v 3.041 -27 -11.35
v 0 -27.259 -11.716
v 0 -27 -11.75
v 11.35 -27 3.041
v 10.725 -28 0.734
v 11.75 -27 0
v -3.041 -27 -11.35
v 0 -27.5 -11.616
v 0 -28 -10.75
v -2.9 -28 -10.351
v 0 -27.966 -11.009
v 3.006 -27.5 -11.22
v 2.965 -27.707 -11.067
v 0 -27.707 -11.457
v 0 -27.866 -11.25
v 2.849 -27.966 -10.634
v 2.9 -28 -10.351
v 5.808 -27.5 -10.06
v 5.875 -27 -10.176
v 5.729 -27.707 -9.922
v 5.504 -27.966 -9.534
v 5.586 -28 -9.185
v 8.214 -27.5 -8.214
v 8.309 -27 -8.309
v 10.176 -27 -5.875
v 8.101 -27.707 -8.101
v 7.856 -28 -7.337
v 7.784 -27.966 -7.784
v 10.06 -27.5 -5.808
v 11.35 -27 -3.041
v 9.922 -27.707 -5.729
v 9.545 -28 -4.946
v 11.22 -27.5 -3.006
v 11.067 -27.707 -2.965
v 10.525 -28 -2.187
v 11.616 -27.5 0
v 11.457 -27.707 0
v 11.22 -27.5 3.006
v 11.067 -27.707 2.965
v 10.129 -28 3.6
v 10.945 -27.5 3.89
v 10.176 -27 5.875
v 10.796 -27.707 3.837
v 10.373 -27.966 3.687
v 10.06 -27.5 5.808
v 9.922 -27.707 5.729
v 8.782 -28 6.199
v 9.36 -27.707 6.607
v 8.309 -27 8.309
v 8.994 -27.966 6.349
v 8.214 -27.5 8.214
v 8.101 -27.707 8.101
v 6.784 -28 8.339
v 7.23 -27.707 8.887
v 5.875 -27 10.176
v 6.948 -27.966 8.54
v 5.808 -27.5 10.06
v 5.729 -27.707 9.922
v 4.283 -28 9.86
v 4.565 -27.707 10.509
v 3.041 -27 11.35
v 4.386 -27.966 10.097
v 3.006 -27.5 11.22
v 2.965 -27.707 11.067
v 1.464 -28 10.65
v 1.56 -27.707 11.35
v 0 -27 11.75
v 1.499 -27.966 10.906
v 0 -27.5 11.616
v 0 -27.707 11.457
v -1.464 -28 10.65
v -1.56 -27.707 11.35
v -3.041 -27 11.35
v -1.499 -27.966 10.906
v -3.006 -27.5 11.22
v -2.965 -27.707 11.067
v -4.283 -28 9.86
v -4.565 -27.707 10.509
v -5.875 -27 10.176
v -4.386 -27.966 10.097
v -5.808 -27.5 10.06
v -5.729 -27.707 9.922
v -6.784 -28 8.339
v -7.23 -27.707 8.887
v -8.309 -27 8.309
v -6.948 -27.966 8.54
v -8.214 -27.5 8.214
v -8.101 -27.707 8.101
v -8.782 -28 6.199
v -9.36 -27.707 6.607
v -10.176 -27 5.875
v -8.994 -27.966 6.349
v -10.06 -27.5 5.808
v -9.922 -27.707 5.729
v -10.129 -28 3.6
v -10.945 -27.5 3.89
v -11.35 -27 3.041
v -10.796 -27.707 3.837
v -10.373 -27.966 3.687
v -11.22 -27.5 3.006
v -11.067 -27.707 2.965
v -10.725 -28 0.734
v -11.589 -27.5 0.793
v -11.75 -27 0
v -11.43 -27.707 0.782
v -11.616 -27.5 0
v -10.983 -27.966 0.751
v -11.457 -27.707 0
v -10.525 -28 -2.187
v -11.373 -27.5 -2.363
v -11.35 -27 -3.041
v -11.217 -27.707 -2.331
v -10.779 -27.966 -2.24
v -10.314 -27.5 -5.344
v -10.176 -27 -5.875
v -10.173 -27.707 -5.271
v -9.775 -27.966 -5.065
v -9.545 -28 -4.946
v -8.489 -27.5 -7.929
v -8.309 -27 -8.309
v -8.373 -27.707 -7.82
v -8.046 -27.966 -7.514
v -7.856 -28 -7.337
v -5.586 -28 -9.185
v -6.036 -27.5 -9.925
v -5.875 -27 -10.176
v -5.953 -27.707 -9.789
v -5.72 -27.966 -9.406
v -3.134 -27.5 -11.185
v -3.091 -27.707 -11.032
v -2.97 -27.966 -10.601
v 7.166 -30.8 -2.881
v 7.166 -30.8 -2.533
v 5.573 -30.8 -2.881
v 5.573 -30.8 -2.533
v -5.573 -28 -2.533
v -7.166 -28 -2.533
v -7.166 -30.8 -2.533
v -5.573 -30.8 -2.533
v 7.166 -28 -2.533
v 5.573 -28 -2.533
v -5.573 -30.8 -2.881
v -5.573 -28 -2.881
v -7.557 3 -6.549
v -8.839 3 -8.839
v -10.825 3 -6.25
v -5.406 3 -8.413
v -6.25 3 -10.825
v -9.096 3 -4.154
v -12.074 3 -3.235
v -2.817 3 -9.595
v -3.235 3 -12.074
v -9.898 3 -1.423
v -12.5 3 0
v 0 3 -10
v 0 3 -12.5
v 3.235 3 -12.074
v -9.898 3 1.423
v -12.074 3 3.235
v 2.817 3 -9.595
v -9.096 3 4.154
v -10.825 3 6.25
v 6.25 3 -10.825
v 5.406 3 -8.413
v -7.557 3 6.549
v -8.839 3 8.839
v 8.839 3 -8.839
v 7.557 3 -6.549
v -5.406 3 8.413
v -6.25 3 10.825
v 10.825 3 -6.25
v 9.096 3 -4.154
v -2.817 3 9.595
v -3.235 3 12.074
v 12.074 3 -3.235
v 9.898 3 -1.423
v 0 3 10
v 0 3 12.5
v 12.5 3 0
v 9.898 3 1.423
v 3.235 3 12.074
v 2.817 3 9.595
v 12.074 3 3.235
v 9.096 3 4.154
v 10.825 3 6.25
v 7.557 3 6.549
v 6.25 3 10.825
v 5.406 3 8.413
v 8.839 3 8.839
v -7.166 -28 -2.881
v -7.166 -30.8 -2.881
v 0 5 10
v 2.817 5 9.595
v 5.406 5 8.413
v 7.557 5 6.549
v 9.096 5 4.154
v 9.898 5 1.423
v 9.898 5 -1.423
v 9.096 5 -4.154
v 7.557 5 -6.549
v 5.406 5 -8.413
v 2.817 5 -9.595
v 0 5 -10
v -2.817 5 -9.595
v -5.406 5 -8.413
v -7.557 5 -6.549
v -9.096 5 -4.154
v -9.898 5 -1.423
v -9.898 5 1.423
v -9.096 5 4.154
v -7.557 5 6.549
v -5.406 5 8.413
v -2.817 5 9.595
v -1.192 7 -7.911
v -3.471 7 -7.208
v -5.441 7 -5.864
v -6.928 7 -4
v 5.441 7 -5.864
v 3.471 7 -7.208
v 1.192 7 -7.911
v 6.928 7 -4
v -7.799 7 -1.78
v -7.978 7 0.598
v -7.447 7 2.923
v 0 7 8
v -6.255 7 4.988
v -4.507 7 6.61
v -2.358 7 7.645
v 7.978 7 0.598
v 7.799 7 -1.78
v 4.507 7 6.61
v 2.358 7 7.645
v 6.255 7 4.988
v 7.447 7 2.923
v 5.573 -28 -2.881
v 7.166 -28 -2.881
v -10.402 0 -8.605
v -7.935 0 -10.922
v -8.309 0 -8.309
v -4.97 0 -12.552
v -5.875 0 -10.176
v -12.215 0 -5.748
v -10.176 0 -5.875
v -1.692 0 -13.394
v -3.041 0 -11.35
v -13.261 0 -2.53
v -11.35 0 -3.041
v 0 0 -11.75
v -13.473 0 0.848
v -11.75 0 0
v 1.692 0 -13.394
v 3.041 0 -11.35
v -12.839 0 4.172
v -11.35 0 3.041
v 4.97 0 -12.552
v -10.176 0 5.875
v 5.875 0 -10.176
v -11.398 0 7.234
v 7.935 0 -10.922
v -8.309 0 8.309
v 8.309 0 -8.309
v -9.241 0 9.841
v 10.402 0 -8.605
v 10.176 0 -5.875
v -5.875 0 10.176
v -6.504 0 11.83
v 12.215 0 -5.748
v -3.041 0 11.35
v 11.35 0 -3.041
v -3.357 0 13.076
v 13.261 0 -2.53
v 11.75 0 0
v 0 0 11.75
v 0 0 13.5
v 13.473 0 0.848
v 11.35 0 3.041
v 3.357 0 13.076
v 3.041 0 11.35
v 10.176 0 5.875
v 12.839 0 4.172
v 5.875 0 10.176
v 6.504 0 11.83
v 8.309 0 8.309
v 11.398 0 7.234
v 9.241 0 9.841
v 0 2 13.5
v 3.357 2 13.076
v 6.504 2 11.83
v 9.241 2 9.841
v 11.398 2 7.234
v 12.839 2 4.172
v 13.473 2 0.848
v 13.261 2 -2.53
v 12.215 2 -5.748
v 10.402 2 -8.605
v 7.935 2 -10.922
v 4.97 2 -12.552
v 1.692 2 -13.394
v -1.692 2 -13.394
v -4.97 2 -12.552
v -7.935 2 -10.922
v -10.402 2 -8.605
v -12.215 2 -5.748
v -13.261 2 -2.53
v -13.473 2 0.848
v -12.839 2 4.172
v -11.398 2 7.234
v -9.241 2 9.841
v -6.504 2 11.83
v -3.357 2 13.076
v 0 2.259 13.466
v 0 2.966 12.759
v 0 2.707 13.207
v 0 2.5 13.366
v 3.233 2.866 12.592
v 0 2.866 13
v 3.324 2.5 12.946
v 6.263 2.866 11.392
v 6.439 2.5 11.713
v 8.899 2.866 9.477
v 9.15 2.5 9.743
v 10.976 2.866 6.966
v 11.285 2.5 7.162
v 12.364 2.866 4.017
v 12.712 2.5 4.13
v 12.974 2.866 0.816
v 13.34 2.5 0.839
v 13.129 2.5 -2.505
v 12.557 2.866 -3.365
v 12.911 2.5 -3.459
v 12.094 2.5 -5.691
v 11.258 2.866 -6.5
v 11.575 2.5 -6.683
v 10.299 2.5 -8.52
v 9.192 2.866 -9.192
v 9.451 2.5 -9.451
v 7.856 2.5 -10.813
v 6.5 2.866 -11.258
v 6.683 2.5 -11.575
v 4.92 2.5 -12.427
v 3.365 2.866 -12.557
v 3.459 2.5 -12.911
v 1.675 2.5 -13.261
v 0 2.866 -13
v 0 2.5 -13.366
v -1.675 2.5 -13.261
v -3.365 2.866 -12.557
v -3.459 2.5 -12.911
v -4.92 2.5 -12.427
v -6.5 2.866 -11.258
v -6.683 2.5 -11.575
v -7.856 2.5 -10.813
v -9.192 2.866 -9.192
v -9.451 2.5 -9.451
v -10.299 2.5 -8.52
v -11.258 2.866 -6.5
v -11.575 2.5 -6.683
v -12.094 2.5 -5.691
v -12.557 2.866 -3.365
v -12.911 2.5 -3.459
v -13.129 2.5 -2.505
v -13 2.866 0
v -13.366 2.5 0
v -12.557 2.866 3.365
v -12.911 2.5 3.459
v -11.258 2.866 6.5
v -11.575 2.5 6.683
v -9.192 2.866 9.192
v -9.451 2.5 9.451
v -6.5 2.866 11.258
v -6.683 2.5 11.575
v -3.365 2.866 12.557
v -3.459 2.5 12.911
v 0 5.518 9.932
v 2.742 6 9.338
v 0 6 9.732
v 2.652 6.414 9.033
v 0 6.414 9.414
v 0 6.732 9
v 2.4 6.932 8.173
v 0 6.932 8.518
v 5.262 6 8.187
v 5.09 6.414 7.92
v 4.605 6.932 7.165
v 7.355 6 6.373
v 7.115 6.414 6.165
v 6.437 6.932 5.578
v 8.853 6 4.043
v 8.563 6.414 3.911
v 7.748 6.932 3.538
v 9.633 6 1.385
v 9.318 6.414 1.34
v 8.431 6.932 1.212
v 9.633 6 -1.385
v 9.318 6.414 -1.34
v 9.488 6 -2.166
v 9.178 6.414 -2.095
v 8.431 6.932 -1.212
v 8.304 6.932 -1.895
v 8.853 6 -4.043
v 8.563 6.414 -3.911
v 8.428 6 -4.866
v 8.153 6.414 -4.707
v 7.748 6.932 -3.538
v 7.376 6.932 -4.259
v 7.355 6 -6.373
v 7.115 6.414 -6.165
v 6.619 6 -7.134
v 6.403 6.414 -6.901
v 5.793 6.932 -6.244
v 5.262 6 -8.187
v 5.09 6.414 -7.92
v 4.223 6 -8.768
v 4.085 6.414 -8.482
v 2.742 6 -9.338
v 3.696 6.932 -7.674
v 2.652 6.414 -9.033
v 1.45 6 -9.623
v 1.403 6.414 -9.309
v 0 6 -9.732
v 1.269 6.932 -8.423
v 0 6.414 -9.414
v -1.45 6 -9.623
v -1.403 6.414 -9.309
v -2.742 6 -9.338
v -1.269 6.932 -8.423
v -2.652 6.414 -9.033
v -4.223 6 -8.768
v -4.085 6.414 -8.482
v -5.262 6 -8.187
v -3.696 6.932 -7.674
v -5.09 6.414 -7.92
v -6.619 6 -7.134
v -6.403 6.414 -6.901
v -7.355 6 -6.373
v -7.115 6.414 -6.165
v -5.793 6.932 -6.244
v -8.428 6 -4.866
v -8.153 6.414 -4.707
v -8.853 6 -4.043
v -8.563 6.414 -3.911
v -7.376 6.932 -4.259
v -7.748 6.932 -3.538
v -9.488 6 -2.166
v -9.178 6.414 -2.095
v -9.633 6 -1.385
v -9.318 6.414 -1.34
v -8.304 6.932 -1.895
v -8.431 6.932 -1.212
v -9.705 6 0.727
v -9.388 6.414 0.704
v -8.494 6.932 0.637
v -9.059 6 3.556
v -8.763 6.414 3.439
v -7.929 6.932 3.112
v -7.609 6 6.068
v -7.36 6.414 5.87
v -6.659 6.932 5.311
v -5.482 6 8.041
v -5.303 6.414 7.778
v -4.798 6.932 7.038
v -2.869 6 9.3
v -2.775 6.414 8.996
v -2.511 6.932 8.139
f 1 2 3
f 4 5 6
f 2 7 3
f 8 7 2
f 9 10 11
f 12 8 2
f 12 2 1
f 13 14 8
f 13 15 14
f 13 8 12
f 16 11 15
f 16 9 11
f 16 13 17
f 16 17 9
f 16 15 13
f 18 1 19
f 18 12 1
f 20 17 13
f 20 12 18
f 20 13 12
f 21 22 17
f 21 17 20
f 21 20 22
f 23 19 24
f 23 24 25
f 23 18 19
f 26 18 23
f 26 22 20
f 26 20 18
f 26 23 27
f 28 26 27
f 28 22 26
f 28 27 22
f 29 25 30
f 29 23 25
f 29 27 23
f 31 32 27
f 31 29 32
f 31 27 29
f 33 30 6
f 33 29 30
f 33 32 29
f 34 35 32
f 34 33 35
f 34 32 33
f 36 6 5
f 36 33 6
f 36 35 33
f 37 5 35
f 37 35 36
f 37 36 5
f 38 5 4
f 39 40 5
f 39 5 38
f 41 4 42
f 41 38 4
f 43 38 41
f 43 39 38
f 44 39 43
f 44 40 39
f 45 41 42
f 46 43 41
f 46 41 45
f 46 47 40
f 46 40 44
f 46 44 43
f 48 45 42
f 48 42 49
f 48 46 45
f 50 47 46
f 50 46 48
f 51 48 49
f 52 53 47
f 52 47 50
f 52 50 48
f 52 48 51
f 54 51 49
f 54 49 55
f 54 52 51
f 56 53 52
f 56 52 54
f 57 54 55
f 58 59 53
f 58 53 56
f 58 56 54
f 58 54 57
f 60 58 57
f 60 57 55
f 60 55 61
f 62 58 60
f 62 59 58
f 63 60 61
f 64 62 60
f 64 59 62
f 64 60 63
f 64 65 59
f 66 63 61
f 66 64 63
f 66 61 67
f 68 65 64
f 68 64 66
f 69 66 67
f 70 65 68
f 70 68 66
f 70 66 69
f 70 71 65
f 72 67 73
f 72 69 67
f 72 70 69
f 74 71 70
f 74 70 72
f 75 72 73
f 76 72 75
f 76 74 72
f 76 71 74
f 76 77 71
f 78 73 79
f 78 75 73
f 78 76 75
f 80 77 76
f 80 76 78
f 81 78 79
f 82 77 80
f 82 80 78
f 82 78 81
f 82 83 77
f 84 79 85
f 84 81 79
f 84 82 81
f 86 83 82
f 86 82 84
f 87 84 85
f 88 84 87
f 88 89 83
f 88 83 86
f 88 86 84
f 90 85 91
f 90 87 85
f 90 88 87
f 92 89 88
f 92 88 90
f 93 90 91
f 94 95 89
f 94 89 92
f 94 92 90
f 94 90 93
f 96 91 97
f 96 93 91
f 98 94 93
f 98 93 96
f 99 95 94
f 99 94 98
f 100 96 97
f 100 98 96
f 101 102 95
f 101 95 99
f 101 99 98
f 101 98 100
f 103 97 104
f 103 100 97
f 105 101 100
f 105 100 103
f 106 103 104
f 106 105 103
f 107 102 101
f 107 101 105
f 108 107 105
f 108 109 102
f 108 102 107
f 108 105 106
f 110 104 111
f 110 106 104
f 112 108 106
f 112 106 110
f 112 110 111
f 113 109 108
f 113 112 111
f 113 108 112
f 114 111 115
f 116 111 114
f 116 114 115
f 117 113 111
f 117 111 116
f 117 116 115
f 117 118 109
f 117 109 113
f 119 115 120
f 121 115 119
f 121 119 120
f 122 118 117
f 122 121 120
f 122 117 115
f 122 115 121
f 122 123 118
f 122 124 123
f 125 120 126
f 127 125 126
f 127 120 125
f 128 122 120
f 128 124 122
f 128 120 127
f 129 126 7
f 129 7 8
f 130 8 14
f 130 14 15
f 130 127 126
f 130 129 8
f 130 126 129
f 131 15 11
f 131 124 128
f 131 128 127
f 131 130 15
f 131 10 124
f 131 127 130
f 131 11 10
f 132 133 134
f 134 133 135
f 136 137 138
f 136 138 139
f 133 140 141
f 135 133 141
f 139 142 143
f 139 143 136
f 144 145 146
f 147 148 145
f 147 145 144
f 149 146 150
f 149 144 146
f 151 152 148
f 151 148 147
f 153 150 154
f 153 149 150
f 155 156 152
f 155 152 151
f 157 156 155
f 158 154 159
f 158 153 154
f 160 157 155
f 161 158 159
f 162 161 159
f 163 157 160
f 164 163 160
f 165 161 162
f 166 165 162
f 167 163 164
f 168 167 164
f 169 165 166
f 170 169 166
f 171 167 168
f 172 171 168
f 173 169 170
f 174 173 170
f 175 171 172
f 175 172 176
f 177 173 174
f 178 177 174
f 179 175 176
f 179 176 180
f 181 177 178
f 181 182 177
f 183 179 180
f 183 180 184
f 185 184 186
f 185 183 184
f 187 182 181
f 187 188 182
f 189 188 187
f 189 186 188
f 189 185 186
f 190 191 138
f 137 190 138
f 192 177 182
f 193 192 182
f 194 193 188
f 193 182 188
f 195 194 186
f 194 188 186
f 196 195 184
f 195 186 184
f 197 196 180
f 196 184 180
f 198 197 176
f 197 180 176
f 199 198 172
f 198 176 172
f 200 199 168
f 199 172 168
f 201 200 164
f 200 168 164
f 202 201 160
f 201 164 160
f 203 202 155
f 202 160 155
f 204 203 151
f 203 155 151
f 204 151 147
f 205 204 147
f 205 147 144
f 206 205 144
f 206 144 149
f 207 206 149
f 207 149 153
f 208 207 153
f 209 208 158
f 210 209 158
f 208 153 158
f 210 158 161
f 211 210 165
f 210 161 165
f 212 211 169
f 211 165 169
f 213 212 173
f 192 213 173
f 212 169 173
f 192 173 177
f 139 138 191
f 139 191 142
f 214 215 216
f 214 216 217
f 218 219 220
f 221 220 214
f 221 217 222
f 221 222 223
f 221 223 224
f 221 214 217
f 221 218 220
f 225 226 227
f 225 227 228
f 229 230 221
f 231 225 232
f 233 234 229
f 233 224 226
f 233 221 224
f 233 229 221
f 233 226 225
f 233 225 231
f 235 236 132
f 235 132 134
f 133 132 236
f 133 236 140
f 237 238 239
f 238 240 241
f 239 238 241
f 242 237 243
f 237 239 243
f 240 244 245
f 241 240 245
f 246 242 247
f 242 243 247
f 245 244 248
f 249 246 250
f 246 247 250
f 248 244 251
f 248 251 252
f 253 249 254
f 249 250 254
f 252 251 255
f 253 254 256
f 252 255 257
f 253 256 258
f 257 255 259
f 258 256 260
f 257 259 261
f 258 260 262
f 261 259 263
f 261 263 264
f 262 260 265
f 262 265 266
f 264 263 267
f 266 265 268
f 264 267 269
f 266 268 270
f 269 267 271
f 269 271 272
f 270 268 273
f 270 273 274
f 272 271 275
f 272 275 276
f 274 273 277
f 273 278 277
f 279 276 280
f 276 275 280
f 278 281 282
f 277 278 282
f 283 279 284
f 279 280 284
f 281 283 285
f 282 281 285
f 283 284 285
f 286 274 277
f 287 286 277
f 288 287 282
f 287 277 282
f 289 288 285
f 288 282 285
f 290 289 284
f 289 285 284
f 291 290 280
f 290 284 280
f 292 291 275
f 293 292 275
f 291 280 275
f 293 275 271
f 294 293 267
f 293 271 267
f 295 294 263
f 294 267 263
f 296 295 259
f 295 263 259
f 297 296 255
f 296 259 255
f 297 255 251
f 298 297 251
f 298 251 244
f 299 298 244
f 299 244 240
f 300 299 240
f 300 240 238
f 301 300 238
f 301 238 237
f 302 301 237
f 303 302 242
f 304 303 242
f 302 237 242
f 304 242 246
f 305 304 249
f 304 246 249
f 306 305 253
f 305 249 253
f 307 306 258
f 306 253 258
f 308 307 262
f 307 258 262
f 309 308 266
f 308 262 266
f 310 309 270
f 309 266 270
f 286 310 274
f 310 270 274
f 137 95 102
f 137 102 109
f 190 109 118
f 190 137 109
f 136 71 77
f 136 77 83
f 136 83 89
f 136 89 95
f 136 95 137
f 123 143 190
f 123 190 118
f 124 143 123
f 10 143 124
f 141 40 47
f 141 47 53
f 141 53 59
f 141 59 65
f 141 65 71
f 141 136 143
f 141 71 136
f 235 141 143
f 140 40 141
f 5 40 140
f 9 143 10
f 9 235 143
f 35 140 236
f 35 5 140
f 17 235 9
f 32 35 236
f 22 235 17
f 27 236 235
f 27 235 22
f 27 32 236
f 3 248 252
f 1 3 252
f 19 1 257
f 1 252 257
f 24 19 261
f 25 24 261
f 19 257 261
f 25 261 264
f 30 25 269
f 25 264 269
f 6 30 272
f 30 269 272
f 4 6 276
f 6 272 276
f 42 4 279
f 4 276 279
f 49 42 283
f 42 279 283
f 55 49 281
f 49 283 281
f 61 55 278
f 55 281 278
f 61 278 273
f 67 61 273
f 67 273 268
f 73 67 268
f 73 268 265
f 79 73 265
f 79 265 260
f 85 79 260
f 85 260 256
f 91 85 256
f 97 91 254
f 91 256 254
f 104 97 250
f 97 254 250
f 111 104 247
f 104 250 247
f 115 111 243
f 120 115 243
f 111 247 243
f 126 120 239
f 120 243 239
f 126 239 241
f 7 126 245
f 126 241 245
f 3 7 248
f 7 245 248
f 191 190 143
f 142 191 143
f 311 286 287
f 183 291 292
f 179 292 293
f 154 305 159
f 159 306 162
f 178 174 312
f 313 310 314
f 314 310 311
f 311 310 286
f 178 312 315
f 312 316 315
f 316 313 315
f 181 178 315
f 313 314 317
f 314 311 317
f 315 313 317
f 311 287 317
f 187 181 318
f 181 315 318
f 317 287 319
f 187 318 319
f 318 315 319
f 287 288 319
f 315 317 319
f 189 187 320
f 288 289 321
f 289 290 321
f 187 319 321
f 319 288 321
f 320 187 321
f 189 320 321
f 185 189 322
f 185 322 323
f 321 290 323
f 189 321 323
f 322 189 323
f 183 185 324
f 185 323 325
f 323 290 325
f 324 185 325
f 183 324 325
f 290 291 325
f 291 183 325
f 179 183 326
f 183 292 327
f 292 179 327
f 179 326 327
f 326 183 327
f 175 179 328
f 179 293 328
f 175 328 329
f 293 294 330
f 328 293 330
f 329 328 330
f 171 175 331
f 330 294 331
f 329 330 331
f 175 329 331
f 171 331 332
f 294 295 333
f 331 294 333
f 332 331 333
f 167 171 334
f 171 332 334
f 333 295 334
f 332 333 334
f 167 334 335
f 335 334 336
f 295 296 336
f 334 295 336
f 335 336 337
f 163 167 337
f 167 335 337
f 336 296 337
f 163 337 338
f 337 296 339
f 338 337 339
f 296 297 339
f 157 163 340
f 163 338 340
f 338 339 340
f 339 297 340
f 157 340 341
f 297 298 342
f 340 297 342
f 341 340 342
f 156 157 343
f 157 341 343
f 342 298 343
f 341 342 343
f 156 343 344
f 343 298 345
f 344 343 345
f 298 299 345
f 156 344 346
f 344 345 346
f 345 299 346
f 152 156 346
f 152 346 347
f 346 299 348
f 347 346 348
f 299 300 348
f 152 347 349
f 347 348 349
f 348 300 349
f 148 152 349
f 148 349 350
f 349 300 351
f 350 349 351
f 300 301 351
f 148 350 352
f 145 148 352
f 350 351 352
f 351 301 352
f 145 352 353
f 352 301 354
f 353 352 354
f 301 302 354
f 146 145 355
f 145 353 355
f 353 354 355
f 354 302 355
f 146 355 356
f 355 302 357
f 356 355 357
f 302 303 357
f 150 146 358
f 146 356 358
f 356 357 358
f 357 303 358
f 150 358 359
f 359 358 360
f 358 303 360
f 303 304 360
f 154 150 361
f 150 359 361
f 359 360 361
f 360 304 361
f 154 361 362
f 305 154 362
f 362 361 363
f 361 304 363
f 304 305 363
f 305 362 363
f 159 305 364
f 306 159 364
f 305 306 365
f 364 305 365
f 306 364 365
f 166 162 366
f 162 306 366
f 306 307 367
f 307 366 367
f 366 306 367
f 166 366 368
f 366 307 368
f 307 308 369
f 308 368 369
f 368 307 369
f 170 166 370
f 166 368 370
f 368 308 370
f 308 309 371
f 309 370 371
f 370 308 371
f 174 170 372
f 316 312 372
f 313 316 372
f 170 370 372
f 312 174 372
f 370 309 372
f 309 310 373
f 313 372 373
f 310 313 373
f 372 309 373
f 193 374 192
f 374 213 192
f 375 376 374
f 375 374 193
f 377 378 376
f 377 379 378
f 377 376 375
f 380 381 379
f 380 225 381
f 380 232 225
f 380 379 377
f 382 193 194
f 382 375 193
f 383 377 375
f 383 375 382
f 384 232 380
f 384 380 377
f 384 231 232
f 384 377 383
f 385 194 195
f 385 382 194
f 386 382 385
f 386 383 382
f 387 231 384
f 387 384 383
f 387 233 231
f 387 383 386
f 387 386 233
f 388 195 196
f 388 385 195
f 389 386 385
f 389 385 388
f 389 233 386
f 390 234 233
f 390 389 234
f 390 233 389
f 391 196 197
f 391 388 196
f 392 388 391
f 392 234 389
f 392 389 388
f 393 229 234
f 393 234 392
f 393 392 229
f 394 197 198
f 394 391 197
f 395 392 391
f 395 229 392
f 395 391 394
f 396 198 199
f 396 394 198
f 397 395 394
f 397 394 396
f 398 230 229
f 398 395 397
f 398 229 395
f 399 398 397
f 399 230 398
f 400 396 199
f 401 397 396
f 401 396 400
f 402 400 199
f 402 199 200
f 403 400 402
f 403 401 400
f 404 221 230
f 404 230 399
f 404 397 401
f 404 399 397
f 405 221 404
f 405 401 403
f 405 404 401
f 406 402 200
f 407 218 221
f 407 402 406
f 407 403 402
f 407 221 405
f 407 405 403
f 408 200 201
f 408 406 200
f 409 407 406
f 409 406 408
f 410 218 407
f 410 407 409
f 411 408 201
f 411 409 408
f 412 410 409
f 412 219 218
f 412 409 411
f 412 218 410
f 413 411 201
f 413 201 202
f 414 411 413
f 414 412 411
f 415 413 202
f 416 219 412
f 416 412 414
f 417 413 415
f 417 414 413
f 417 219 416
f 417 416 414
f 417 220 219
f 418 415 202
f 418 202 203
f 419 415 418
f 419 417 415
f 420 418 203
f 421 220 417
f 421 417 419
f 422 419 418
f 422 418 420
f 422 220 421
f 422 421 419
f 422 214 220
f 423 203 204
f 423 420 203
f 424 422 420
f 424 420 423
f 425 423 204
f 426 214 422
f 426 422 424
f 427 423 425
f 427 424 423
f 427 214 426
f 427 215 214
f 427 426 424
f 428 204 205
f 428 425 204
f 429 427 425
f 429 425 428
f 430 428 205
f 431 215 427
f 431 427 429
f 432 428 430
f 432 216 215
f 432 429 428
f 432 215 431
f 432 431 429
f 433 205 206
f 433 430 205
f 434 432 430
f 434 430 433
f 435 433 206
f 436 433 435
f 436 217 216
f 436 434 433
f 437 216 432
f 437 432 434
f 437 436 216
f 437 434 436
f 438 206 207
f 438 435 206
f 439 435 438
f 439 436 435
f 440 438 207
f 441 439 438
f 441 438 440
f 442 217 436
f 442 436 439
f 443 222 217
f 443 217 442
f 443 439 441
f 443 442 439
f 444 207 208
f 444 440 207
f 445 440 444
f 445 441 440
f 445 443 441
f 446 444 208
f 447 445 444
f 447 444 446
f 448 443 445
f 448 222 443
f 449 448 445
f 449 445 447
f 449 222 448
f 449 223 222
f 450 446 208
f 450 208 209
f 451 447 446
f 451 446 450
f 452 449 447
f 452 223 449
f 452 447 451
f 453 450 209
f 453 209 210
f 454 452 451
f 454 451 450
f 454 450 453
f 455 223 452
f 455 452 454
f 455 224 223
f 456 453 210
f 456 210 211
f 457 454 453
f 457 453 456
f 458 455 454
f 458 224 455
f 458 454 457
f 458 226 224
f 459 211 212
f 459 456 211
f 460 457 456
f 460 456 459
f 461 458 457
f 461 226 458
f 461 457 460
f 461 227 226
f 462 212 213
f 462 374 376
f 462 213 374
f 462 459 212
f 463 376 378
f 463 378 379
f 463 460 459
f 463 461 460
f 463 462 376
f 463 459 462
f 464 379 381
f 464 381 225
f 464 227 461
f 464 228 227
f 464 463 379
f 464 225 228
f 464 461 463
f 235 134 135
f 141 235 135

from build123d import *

# Parameters (mm, degrees)
ESQUISSE1_R        = 13.5
BOSS_EXTRU_1_DEPTH = 3
ESQUISSE2_R        = 10
BOSS_EXTRU_2_DEPTH = 4
ESQUISSE3_R        = 11.75
BOSS_EXTRU_3_DEPTH = 28
ESQUISSE4_W        = 1.593426019
ESQUISSE4_H        = 0.348561941
BOSS_EXTRU_4_DEPTH = 2.8
CONG_1_R           = 2
CONG_2_R           = 1
CONG_3_R           = 1


with BuildPart() as part:
    # Esquisse1 → Boss.-Extru.1 (new body)
    with BuildSketch(Plane(origin=(0, 0, 0), x_dir=(1, 0, 0), z_dir=(0, 1, 0))):
        with Locations(Location((0, 0, 0), (0, 0, 270))):
            Circle(ESQUISSE1_R)
    extrude(amount=BOSS_EXTRU_1_DEPTH)

    # Esquisse2 → Boss.-Extru.2 (add)
    with BuildSketch(Plane(origin=(0, 3, 0), x_dir=(1, 0, 0), z_dir=(0, 1, 0))):
        with Locations(Location((0, 0, 0), (0, 0, 270))):
            Circle(ESQUISSE2_R)
    extrude(amount=BOSS_EXTRU_2_DEPTH)

    # Esquisse3 → Boss.-Extru.3 (add)
    with BuildSketch(Plane.XZ):
        with Locations(Location((0, 0, 0), (0, 0, 270))):
            Circle(ESQUISSE3_R)
    extrude(amount=BOSS_EXTRU_3_DEPTH)

    # Esquisse4 → Boss.-Extru.4 (add)
    with BuildSketch(Plane.XZ.offset(28)):
        with Locations((-6.369565613, -2.707032561)):
            Rectangle(ESQUISSE4_W, ESQUISSE4_H)
    boss_extru_4 = extrude(amount=BOSS_EXTRU_4_DEPTH)

    # Symétrie1: Boss.-Extru.4 across plane
    add(boss_extru_4.mirror(Plane(origin=(0, 0, 0), x_dir=(0, 0, 1), z_dir=(1, 0, 0))))

    # Congé1
    cong_1_edges = [part.edges().sort_by_distance(p)[0] for p in [
        (0, 7, -10),
    ]]
    fillet(cong_1_edges, radius=CONG_1_R)

    # Congé2
    cong_2_edges = [part.edges().sort_by_distance(p)[0] for p in [
        (0, 3, -13.5),
    ]]
    fillet(cong_2_edges, radius=CONG_2_R)

    # Congé3
    cong_3_edges = [part.edges().sort_by_distance(p)[0] for p in [
        (0, -28, 11.75),
    ]]
    fillet(cong_3_edges, radius=CONG_3_R)


solid = part.part
